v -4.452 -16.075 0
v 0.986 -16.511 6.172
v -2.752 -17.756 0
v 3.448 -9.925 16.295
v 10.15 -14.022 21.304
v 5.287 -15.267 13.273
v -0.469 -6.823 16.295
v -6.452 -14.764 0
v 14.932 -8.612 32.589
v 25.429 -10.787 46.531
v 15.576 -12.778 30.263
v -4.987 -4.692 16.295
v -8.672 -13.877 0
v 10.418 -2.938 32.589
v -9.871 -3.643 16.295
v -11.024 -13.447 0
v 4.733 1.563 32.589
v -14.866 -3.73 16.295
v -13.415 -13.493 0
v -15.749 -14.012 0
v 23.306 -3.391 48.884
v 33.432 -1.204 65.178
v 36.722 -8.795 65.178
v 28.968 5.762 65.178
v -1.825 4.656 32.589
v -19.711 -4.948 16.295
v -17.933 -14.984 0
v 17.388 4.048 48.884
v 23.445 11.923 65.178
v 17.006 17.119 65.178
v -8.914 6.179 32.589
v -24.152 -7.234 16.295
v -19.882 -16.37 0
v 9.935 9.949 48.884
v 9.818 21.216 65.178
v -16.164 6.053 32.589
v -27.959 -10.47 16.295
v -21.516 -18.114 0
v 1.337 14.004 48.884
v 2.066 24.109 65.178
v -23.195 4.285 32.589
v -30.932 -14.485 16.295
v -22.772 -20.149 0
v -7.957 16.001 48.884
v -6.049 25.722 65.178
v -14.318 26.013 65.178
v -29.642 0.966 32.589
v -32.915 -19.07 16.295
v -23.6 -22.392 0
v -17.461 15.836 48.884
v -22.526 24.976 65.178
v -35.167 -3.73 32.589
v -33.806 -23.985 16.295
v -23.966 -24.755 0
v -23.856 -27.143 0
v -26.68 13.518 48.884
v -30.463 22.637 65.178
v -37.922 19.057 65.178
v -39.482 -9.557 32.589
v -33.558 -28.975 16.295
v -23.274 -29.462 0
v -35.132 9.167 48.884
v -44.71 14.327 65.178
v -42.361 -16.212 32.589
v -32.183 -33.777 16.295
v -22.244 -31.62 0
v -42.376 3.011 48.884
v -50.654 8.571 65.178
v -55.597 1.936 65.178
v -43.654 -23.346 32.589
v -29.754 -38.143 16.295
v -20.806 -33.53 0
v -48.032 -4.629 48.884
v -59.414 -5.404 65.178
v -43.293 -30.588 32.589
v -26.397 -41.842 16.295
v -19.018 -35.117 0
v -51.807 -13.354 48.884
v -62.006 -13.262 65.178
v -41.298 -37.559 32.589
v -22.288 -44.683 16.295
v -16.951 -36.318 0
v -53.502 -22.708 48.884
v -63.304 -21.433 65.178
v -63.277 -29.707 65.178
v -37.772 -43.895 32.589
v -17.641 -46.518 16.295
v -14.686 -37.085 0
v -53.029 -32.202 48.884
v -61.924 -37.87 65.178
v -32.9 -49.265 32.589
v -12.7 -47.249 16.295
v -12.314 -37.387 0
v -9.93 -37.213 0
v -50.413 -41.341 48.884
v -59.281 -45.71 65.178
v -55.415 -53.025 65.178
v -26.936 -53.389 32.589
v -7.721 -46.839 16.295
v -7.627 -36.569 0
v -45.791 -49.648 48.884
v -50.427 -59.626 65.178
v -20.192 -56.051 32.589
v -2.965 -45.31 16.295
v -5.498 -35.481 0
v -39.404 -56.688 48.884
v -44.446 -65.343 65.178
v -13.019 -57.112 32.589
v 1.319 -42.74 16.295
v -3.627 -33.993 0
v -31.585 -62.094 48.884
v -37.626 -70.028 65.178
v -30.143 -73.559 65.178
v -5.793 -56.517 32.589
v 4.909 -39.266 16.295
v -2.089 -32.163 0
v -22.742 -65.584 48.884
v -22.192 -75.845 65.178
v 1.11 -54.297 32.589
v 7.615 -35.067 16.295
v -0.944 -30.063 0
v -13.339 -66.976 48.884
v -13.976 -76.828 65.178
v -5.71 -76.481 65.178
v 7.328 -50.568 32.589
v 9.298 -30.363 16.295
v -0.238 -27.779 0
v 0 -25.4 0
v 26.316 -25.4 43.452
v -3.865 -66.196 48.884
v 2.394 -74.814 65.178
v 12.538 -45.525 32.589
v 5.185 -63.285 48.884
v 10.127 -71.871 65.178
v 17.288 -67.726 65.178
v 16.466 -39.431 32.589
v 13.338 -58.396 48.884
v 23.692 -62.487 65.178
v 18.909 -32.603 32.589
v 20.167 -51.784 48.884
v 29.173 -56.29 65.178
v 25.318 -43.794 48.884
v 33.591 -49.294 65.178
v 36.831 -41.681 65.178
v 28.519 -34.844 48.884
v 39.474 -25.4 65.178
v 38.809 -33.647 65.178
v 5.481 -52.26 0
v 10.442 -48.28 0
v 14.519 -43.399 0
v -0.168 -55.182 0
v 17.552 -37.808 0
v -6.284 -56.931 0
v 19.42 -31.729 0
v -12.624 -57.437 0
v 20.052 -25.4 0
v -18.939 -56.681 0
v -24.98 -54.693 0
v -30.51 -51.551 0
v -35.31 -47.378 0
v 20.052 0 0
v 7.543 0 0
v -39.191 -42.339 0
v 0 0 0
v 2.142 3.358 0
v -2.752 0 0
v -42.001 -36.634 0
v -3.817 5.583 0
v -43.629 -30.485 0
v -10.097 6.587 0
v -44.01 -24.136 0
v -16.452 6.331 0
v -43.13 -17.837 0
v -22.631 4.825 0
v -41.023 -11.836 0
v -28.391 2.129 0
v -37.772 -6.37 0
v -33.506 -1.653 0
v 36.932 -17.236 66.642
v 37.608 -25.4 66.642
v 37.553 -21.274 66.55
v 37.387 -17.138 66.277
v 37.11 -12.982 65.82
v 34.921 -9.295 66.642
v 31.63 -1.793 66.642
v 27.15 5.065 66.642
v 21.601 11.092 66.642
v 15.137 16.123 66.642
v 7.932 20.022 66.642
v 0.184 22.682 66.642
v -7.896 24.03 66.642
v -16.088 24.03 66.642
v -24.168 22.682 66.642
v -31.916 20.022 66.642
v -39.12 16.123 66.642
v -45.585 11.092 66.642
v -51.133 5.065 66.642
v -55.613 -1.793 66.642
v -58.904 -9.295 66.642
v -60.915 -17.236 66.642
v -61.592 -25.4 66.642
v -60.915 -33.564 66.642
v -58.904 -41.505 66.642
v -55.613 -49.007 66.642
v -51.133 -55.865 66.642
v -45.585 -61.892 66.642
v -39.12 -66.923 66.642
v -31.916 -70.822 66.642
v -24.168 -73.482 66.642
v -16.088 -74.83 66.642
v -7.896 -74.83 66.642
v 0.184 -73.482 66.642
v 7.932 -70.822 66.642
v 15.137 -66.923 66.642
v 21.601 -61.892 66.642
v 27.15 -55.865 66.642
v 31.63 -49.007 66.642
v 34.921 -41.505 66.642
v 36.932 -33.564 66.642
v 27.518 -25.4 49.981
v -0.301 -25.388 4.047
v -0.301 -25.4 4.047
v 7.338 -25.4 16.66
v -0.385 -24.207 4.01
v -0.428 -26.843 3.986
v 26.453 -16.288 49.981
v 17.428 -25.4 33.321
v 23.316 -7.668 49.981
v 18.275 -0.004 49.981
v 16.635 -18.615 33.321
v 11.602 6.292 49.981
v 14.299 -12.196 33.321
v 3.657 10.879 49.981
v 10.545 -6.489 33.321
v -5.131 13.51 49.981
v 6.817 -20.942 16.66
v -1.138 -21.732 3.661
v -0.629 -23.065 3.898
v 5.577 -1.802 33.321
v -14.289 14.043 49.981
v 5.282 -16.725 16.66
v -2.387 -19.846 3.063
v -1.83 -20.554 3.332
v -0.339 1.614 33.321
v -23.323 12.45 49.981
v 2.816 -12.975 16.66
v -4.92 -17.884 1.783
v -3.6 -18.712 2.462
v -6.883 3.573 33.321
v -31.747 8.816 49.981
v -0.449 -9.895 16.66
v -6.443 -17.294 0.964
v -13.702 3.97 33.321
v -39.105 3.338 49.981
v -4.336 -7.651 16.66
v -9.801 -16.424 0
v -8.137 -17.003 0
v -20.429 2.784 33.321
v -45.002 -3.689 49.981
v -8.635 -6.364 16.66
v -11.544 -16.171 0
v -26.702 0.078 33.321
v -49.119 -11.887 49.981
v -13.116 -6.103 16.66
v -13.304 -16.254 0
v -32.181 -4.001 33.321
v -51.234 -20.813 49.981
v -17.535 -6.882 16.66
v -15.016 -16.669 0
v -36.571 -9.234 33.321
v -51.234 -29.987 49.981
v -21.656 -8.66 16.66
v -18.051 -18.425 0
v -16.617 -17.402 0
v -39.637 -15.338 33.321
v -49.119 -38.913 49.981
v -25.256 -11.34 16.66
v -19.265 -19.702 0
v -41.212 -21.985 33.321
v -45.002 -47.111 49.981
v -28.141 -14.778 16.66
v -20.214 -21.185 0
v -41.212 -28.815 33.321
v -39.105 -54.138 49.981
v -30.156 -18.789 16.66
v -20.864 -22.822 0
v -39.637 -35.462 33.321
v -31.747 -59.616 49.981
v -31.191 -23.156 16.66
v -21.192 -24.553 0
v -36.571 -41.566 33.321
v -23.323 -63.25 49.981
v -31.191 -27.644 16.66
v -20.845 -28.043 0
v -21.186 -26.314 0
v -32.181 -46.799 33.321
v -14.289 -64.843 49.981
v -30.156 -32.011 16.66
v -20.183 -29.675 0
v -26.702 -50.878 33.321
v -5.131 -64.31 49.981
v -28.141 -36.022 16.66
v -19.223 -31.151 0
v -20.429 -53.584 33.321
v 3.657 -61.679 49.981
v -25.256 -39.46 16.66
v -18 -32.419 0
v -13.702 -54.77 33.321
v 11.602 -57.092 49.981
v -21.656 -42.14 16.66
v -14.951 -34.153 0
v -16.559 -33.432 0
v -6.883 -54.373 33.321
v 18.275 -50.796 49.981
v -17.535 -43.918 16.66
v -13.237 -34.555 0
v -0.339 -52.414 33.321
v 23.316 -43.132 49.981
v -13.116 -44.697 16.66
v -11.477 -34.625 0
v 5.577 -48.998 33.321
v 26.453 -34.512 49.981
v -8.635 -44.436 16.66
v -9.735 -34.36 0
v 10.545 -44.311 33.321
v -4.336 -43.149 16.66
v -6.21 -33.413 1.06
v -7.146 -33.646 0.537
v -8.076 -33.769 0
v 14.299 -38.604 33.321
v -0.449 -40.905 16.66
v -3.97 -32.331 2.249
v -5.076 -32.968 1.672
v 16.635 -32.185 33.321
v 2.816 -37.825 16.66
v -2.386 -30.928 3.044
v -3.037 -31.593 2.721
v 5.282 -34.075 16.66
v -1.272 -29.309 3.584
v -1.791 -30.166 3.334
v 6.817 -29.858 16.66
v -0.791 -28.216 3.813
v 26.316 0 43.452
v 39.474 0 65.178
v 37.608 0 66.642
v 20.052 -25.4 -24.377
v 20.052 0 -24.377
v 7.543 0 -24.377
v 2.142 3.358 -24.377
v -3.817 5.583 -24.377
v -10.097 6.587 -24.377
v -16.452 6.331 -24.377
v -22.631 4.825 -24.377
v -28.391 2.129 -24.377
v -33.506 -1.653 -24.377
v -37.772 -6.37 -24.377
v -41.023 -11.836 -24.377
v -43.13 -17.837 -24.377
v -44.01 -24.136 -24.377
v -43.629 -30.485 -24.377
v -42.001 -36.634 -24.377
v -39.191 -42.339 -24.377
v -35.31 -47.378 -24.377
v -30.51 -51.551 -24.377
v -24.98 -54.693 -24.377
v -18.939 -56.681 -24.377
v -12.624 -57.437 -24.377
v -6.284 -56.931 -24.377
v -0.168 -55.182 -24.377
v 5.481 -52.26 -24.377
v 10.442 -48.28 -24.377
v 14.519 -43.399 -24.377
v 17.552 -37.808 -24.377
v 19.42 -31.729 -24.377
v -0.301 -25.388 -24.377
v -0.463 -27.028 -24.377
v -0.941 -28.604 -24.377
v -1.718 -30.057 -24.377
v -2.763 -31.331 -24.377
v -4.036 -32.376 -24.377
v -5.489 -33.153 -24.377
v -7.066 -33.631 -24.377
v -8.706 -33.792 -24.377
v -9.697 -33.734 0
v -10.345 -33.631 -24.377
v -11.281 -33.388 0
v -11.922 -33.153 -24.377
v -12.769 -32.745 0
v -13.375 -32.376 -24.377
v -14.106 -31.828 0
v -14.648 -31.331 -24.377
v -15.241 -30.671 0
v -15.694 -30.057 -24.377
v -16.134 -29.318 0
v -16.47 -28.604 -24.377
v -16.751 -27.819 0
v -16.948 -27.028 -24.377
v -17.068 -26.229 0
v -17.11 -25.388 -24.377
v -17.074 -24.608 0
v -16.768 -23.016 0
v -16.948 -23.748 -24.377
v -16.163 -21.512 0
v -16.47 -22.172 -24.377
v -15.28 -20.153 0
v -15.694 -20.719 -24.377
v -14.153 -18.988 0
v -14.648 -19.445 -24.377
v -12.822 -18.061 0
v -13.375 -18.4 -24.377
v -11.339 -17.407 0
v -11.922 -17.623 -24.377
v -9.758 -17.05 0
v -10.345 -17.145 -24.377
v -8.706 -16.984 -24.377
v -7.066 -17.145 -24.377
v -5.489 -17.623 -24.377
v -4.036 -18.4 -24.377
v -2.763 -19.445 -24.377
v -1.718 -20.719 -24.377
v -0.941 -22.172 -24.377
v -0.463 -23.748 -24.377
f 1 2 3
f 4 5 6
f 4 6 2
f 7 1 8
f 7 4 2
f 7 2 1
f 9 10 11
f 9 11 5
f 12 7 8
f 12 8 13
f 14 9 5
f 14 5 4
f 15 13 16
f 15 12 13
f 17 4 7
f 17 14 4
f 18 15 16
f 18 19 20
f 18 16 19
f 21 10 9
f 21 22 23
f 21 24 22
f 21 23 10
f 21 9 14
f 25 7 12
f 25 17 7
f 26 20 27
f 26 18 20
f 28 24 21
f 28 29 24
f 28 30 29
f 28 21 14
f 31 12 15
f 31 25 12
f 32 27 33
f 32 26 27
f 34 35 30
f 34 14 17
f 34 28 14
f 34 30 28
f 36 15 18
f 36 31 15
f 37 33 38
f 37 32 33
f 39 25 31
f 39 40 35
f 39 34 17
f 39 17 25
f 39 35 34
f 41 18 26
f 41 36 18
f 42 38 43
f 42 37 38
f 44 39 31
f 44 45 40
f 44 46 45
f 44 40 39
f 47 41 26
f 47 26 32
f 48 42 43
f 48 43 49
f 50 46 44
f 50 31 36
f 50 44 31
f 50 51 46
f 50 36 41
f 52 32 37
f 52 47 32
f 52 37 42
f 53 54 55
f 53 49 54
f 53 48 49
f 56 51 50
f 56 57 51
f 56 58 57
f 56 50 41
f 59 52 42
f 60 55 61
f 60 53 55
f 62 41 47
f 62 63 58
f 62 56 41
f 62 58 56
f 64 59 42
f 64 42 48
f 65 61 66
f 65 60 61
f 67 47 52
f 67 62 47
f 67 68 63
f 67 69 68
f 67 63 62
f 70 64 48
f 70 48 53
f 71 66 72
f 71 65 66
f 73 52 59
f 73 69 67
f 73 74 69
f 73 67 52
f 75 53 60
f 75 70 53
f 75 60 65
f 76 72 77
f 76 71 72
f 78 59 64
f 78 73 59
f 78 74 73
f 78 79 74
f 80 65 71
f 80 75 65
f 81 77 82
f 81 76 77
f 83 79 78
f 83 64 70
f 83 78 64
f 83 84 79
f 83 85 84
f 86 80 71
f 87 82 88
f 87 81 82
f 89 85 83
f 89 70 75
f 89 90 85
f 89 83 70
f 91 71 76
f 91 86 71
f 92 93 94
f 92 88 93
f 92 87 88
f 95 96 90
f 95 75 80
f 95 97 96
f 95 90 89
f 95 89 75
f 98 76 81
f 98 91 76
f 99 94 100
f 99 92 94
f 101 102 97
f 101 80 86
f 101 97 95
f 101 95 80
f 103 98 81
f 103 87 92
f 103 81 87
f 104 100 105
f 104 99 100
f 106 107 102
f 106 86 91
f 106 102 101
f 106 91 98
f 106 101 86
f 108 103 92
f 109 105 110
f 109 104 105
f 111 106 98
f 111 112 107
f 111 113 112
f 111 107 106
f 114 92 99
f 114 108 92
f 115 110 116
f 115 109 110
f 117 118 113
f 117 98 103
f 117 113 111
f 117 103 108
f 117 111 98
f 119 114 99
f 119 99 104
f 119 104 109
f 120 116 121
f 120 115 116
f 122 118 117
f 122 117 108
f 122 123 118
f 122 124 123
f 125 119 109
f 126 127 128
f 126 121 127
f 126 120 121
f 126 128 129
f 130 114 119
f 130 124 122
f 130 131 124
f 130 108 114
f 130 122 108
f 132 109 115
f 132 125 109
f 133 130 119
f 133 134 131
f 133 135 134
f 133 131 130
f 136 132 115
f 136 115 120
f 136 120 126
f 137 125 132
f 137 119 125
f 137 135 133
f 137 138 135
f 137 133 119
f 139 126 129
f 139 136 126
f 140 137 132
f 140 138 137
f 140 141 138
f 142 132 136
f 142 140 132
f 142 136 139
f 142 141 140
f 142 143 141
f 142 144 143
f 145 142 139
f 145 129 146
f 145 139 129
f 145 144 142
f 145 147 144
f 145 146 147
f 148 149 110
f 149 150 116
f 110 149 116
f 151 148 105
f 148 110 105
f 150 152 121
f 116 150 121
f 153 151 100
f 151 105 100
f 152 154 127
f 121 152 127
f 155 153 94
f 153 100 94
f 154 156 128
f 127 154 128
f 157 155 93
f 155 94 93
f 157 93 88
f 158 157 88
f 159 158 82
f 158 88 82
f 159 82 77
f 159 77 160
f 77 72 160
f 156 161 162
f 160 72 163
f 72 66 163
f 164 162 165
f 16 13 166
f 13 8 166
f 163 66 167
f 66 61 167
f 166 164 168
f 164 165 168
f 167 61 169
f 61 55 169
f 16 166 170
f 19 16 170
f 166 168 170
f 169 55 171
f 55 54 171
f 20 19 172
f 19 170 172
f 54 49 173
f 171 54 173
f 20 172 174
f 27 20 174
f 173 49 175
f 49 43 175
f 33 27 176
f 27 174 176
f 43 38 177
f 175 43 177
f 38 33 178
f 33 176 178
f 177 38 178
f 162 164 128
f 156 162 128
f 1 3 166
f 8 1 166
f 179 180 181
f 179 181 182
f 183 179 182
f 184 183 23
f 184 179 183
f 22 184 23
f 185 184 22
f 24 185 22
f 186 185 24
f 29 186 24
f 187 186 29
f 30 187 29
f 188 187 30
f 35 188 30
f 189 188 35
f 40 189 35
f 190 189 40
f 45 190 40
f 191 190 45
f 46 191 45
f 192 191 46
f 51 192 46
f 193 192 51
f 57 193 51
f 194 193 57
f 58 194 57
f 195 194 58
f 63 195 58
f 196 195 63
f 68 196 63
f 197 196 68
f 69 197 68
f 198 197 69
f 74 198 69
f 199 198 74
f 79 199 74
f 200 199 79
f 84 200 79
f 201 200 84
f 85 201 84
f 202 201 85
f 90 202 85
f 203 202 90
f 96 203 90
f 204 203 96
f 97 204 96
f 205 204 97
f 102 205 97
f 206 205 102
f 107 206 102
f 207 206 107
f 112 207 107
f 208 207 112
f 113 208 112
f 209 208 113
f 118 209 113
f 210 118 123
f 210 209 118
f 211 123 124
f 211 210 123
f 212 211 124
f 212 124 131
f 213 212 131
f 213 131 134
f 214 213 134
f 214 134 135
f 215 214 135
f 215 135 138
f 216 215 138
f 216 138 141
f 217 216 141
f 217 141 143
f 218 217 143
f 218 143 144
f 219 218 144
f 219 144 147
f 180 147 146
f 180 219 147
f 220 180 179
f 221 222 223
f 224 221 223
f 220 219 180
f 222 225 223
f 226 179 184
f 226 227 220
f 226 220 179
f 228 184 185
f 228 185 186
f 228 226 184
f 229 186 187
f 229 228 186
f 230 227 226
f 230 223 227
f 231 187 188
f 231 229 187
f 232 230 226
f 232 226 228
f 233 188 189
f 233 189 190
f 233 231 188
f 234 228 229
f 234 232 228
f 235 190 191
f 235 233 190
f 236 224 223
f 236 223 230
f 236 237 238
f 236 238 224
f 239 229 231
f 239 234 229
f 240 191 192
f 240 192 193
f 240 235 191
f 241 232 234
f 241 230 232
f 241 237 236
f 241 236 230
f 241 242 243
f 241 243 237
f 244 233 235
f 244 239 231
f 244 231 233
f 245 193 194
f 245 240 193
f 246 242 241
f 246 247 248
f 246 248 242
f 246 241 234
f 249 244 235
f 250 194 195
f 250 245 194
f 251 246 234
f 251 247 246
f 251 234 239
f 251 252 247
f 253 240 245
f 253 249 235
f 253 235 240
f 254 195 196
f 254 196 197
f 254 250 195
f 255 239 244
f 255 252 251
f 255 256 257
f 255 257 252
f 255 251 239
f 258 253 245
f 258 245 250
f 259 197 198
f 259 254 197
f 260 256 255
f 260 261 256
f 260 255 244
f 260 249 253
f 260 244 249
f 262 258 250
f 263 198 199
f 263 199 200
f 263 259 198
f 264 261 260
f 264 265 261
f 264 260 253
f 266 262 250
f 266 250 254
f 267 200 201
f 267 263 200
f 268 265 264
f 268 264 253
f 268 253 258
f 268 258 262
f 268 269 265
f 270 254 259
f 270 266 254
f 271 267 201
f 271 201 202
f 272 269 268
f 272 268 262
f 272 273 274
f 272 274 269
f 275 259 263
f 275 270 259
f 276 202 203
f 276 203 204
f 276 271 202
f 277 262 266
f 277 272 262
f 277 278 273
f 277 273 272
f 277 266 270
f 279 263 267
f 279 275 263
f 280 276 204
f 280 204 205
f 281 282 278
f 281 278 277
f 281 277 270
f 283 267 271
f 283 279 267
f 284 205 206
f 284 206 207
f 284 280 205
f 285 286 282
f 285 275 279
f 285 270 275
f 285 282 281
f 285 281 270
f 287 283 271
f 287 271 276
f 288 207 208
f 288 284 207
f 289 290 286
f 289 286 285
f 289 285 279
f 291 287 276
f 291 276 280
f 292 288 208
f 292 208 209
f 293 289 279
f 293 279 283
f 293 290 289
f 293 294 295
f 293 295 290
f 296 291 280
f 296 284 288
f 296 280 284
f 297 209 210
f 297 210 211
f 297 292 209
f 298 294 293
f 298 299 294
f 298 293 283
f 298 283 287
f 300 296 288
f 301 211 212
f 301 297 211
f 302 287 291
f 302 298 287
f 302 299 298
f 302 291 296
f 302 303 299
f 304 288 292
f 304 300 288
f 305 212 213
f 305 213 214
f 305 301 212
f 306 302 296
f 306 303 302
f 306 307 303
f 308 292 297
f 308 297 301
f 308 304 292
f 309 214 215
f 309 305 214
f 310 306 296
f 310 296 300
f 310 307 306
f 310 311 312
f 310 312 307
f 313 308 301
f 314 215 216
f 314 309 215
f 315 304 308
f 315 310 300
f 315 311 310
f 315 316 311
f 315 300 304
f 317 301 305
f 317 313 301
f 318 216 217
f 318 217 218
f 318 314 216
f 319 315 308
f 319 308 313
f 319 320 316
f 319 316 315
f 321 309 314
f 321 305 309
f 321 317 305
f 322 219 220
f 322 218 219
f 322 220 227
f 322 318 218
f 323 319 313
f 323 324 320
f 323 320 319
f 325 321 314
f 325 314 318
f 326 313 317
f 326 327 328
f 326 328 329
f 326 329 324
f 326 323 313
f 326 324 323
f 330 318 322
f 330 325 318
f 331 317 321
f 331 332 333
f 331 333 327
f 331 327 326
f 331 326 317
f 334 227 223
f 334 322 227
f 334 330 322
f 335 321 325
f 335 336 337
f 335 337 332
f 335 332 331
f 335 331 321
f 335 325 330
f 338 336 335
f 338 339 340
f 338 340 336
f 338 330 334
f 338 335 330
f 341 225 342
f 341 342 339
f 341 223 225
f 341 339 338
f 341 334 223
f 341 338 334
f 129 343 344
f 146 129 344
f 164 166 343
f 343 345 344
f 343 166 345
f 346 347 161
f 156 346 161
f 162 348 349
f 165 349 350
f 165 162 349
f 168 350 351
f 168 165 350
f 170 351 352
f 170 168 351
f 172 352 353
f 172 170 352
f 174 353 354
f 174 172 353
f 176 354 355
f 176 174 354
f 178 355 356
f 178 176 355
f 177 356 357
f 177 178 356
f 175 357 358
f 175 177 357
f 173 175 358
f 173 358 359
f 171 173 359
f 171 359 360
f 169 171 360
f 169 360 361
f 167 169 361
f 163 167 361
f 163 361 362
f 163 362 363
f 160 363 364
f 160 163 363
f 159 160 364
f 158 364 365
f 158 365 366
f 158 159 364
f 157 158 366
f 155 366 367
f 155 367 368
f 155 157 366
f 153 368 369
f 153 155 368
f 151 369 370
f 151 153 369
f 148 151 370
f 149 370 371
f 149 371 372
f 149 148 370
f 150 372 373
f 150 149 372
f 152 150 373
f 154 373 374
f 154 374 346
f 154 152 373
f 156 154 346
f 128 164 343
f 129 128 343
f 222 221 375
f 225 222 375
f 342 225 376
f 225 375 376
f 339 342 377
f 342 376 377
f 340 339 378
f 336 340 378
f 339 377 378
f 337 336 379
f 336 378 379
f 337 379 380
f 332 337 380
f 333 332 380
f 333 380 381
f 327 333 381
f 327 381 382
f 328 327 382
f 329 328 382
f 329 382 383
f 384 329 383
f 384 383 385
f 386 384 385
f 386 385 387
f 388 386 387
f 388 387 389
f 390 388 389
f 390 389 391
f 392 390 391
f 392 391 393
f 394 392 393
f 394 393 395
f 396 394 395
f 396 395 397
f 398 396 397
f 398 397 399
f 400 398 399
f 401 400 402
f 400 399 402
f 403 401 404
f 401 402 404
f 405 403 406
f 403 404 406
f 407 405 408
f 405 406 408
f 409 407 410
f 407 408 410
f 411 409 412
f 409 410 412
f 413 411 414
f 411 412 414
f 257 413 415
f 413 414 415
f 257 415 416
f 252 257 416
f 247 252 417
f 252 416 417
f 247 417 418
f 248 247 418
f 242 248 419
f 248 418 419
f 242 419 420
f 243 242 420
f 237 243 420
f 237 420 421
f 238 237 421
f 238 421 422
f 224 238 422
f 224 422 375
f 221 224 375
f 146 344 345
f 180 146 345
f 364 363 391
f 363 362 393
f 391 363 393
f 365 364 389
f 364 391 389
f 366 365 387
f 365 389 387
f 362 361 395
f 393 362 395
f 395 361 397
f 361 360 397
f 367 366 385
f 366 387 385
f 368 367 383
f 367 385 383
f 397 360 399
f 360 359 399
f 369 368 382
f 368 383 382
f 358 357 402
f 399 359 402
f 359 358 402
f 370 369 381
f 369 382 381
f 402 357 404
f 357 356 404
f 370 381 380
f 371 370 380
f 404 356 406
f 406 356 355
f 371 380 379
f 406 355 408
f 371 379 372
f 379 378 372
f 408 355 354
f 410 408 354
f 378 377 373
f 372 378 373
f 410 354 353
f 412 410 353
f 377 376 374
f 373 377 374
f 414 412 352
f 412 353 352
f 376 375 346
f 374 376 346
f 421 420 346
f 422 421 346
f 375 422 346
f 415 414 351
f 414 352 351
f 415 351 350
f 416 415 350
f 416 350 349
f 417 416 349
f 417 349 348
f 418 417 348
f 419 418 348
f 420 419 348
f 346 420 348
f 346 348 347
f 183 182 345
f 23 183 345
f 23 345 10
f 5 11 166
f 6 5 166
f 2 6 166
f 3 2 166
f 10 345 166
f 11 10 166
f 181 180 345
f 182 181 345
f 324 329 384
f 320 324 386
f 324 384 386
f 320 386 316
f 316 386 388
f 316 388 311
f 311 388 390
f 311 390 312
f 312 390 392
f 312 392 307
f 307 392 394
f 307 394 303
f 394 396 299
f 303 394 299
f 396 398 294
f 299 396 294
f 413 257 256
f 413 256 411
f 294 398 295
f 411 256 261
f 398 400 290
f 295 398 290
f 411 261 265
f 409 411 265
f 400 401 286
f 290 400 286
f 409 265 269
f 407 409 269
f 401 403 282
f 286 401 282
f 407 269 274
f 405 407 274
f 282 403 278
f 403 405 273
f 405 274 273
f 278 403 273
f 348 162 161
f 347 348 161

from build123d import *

# Parameters (mm, degrees)
F1_DEPTH = 25.4
F3_R     = 8.4043984654
F4_DEPTH = 50.8


with BuildPart() as f1:
    # F0 (on Front) → F1 (new body)
    with BuildSketch(Plane.XZ):
        Polygon((20.0516469777, 0), (0, 0), (26.3161629428, 43.4522676965), (39.4742444142, 65.1784015448), (37.6082088482, 66.6415809447), (-2.7521864977, 0), (-11.9916703552, 0), (-11.9916703552, -24.3765115738), (20.0516469777, -24.3765115738), align=None)
    extrude(amount=F1_DEPTH)

    # F1_face (on face) → F2 (revolve)
    with BuildSketch(Plane(origin=(6.7718176649, -25.4, -3.6801313591), x_dir=(1, 0, 0), z_dir=(0, -1, 0))):
        Polygon((13.2798293128, 3.6801313591), (-6.7718176649, 3.6801313591), (32.7024267493, 68.8585329039), (30.8363911833, 70.3217123039), (-9.5240041626, 3.6801313591), (-18.7634880201, 3.6801313591), (-18.7634880201, -20.6963802146), (13.2798293128, -20.6963802146), align=None)
    revolve(axis=Axis((-11.9916703552, -25.4, -12.1882557869), (0, 0, 1)))

    # F3 (on face) → F4 (cut)
    with BuildSketch(Plane(origin=(0, 0, -24.3765115738), x_dir=(1, 0, 0), z_dir=(0, 0, -1))):
        with Locations((-8.7055349723, 25.3879558295)):
            Circle(F3_R)
    extrude(amount=-F4_DEPTH, mode=Mode.SUBTRACT)


solid = f1.part
